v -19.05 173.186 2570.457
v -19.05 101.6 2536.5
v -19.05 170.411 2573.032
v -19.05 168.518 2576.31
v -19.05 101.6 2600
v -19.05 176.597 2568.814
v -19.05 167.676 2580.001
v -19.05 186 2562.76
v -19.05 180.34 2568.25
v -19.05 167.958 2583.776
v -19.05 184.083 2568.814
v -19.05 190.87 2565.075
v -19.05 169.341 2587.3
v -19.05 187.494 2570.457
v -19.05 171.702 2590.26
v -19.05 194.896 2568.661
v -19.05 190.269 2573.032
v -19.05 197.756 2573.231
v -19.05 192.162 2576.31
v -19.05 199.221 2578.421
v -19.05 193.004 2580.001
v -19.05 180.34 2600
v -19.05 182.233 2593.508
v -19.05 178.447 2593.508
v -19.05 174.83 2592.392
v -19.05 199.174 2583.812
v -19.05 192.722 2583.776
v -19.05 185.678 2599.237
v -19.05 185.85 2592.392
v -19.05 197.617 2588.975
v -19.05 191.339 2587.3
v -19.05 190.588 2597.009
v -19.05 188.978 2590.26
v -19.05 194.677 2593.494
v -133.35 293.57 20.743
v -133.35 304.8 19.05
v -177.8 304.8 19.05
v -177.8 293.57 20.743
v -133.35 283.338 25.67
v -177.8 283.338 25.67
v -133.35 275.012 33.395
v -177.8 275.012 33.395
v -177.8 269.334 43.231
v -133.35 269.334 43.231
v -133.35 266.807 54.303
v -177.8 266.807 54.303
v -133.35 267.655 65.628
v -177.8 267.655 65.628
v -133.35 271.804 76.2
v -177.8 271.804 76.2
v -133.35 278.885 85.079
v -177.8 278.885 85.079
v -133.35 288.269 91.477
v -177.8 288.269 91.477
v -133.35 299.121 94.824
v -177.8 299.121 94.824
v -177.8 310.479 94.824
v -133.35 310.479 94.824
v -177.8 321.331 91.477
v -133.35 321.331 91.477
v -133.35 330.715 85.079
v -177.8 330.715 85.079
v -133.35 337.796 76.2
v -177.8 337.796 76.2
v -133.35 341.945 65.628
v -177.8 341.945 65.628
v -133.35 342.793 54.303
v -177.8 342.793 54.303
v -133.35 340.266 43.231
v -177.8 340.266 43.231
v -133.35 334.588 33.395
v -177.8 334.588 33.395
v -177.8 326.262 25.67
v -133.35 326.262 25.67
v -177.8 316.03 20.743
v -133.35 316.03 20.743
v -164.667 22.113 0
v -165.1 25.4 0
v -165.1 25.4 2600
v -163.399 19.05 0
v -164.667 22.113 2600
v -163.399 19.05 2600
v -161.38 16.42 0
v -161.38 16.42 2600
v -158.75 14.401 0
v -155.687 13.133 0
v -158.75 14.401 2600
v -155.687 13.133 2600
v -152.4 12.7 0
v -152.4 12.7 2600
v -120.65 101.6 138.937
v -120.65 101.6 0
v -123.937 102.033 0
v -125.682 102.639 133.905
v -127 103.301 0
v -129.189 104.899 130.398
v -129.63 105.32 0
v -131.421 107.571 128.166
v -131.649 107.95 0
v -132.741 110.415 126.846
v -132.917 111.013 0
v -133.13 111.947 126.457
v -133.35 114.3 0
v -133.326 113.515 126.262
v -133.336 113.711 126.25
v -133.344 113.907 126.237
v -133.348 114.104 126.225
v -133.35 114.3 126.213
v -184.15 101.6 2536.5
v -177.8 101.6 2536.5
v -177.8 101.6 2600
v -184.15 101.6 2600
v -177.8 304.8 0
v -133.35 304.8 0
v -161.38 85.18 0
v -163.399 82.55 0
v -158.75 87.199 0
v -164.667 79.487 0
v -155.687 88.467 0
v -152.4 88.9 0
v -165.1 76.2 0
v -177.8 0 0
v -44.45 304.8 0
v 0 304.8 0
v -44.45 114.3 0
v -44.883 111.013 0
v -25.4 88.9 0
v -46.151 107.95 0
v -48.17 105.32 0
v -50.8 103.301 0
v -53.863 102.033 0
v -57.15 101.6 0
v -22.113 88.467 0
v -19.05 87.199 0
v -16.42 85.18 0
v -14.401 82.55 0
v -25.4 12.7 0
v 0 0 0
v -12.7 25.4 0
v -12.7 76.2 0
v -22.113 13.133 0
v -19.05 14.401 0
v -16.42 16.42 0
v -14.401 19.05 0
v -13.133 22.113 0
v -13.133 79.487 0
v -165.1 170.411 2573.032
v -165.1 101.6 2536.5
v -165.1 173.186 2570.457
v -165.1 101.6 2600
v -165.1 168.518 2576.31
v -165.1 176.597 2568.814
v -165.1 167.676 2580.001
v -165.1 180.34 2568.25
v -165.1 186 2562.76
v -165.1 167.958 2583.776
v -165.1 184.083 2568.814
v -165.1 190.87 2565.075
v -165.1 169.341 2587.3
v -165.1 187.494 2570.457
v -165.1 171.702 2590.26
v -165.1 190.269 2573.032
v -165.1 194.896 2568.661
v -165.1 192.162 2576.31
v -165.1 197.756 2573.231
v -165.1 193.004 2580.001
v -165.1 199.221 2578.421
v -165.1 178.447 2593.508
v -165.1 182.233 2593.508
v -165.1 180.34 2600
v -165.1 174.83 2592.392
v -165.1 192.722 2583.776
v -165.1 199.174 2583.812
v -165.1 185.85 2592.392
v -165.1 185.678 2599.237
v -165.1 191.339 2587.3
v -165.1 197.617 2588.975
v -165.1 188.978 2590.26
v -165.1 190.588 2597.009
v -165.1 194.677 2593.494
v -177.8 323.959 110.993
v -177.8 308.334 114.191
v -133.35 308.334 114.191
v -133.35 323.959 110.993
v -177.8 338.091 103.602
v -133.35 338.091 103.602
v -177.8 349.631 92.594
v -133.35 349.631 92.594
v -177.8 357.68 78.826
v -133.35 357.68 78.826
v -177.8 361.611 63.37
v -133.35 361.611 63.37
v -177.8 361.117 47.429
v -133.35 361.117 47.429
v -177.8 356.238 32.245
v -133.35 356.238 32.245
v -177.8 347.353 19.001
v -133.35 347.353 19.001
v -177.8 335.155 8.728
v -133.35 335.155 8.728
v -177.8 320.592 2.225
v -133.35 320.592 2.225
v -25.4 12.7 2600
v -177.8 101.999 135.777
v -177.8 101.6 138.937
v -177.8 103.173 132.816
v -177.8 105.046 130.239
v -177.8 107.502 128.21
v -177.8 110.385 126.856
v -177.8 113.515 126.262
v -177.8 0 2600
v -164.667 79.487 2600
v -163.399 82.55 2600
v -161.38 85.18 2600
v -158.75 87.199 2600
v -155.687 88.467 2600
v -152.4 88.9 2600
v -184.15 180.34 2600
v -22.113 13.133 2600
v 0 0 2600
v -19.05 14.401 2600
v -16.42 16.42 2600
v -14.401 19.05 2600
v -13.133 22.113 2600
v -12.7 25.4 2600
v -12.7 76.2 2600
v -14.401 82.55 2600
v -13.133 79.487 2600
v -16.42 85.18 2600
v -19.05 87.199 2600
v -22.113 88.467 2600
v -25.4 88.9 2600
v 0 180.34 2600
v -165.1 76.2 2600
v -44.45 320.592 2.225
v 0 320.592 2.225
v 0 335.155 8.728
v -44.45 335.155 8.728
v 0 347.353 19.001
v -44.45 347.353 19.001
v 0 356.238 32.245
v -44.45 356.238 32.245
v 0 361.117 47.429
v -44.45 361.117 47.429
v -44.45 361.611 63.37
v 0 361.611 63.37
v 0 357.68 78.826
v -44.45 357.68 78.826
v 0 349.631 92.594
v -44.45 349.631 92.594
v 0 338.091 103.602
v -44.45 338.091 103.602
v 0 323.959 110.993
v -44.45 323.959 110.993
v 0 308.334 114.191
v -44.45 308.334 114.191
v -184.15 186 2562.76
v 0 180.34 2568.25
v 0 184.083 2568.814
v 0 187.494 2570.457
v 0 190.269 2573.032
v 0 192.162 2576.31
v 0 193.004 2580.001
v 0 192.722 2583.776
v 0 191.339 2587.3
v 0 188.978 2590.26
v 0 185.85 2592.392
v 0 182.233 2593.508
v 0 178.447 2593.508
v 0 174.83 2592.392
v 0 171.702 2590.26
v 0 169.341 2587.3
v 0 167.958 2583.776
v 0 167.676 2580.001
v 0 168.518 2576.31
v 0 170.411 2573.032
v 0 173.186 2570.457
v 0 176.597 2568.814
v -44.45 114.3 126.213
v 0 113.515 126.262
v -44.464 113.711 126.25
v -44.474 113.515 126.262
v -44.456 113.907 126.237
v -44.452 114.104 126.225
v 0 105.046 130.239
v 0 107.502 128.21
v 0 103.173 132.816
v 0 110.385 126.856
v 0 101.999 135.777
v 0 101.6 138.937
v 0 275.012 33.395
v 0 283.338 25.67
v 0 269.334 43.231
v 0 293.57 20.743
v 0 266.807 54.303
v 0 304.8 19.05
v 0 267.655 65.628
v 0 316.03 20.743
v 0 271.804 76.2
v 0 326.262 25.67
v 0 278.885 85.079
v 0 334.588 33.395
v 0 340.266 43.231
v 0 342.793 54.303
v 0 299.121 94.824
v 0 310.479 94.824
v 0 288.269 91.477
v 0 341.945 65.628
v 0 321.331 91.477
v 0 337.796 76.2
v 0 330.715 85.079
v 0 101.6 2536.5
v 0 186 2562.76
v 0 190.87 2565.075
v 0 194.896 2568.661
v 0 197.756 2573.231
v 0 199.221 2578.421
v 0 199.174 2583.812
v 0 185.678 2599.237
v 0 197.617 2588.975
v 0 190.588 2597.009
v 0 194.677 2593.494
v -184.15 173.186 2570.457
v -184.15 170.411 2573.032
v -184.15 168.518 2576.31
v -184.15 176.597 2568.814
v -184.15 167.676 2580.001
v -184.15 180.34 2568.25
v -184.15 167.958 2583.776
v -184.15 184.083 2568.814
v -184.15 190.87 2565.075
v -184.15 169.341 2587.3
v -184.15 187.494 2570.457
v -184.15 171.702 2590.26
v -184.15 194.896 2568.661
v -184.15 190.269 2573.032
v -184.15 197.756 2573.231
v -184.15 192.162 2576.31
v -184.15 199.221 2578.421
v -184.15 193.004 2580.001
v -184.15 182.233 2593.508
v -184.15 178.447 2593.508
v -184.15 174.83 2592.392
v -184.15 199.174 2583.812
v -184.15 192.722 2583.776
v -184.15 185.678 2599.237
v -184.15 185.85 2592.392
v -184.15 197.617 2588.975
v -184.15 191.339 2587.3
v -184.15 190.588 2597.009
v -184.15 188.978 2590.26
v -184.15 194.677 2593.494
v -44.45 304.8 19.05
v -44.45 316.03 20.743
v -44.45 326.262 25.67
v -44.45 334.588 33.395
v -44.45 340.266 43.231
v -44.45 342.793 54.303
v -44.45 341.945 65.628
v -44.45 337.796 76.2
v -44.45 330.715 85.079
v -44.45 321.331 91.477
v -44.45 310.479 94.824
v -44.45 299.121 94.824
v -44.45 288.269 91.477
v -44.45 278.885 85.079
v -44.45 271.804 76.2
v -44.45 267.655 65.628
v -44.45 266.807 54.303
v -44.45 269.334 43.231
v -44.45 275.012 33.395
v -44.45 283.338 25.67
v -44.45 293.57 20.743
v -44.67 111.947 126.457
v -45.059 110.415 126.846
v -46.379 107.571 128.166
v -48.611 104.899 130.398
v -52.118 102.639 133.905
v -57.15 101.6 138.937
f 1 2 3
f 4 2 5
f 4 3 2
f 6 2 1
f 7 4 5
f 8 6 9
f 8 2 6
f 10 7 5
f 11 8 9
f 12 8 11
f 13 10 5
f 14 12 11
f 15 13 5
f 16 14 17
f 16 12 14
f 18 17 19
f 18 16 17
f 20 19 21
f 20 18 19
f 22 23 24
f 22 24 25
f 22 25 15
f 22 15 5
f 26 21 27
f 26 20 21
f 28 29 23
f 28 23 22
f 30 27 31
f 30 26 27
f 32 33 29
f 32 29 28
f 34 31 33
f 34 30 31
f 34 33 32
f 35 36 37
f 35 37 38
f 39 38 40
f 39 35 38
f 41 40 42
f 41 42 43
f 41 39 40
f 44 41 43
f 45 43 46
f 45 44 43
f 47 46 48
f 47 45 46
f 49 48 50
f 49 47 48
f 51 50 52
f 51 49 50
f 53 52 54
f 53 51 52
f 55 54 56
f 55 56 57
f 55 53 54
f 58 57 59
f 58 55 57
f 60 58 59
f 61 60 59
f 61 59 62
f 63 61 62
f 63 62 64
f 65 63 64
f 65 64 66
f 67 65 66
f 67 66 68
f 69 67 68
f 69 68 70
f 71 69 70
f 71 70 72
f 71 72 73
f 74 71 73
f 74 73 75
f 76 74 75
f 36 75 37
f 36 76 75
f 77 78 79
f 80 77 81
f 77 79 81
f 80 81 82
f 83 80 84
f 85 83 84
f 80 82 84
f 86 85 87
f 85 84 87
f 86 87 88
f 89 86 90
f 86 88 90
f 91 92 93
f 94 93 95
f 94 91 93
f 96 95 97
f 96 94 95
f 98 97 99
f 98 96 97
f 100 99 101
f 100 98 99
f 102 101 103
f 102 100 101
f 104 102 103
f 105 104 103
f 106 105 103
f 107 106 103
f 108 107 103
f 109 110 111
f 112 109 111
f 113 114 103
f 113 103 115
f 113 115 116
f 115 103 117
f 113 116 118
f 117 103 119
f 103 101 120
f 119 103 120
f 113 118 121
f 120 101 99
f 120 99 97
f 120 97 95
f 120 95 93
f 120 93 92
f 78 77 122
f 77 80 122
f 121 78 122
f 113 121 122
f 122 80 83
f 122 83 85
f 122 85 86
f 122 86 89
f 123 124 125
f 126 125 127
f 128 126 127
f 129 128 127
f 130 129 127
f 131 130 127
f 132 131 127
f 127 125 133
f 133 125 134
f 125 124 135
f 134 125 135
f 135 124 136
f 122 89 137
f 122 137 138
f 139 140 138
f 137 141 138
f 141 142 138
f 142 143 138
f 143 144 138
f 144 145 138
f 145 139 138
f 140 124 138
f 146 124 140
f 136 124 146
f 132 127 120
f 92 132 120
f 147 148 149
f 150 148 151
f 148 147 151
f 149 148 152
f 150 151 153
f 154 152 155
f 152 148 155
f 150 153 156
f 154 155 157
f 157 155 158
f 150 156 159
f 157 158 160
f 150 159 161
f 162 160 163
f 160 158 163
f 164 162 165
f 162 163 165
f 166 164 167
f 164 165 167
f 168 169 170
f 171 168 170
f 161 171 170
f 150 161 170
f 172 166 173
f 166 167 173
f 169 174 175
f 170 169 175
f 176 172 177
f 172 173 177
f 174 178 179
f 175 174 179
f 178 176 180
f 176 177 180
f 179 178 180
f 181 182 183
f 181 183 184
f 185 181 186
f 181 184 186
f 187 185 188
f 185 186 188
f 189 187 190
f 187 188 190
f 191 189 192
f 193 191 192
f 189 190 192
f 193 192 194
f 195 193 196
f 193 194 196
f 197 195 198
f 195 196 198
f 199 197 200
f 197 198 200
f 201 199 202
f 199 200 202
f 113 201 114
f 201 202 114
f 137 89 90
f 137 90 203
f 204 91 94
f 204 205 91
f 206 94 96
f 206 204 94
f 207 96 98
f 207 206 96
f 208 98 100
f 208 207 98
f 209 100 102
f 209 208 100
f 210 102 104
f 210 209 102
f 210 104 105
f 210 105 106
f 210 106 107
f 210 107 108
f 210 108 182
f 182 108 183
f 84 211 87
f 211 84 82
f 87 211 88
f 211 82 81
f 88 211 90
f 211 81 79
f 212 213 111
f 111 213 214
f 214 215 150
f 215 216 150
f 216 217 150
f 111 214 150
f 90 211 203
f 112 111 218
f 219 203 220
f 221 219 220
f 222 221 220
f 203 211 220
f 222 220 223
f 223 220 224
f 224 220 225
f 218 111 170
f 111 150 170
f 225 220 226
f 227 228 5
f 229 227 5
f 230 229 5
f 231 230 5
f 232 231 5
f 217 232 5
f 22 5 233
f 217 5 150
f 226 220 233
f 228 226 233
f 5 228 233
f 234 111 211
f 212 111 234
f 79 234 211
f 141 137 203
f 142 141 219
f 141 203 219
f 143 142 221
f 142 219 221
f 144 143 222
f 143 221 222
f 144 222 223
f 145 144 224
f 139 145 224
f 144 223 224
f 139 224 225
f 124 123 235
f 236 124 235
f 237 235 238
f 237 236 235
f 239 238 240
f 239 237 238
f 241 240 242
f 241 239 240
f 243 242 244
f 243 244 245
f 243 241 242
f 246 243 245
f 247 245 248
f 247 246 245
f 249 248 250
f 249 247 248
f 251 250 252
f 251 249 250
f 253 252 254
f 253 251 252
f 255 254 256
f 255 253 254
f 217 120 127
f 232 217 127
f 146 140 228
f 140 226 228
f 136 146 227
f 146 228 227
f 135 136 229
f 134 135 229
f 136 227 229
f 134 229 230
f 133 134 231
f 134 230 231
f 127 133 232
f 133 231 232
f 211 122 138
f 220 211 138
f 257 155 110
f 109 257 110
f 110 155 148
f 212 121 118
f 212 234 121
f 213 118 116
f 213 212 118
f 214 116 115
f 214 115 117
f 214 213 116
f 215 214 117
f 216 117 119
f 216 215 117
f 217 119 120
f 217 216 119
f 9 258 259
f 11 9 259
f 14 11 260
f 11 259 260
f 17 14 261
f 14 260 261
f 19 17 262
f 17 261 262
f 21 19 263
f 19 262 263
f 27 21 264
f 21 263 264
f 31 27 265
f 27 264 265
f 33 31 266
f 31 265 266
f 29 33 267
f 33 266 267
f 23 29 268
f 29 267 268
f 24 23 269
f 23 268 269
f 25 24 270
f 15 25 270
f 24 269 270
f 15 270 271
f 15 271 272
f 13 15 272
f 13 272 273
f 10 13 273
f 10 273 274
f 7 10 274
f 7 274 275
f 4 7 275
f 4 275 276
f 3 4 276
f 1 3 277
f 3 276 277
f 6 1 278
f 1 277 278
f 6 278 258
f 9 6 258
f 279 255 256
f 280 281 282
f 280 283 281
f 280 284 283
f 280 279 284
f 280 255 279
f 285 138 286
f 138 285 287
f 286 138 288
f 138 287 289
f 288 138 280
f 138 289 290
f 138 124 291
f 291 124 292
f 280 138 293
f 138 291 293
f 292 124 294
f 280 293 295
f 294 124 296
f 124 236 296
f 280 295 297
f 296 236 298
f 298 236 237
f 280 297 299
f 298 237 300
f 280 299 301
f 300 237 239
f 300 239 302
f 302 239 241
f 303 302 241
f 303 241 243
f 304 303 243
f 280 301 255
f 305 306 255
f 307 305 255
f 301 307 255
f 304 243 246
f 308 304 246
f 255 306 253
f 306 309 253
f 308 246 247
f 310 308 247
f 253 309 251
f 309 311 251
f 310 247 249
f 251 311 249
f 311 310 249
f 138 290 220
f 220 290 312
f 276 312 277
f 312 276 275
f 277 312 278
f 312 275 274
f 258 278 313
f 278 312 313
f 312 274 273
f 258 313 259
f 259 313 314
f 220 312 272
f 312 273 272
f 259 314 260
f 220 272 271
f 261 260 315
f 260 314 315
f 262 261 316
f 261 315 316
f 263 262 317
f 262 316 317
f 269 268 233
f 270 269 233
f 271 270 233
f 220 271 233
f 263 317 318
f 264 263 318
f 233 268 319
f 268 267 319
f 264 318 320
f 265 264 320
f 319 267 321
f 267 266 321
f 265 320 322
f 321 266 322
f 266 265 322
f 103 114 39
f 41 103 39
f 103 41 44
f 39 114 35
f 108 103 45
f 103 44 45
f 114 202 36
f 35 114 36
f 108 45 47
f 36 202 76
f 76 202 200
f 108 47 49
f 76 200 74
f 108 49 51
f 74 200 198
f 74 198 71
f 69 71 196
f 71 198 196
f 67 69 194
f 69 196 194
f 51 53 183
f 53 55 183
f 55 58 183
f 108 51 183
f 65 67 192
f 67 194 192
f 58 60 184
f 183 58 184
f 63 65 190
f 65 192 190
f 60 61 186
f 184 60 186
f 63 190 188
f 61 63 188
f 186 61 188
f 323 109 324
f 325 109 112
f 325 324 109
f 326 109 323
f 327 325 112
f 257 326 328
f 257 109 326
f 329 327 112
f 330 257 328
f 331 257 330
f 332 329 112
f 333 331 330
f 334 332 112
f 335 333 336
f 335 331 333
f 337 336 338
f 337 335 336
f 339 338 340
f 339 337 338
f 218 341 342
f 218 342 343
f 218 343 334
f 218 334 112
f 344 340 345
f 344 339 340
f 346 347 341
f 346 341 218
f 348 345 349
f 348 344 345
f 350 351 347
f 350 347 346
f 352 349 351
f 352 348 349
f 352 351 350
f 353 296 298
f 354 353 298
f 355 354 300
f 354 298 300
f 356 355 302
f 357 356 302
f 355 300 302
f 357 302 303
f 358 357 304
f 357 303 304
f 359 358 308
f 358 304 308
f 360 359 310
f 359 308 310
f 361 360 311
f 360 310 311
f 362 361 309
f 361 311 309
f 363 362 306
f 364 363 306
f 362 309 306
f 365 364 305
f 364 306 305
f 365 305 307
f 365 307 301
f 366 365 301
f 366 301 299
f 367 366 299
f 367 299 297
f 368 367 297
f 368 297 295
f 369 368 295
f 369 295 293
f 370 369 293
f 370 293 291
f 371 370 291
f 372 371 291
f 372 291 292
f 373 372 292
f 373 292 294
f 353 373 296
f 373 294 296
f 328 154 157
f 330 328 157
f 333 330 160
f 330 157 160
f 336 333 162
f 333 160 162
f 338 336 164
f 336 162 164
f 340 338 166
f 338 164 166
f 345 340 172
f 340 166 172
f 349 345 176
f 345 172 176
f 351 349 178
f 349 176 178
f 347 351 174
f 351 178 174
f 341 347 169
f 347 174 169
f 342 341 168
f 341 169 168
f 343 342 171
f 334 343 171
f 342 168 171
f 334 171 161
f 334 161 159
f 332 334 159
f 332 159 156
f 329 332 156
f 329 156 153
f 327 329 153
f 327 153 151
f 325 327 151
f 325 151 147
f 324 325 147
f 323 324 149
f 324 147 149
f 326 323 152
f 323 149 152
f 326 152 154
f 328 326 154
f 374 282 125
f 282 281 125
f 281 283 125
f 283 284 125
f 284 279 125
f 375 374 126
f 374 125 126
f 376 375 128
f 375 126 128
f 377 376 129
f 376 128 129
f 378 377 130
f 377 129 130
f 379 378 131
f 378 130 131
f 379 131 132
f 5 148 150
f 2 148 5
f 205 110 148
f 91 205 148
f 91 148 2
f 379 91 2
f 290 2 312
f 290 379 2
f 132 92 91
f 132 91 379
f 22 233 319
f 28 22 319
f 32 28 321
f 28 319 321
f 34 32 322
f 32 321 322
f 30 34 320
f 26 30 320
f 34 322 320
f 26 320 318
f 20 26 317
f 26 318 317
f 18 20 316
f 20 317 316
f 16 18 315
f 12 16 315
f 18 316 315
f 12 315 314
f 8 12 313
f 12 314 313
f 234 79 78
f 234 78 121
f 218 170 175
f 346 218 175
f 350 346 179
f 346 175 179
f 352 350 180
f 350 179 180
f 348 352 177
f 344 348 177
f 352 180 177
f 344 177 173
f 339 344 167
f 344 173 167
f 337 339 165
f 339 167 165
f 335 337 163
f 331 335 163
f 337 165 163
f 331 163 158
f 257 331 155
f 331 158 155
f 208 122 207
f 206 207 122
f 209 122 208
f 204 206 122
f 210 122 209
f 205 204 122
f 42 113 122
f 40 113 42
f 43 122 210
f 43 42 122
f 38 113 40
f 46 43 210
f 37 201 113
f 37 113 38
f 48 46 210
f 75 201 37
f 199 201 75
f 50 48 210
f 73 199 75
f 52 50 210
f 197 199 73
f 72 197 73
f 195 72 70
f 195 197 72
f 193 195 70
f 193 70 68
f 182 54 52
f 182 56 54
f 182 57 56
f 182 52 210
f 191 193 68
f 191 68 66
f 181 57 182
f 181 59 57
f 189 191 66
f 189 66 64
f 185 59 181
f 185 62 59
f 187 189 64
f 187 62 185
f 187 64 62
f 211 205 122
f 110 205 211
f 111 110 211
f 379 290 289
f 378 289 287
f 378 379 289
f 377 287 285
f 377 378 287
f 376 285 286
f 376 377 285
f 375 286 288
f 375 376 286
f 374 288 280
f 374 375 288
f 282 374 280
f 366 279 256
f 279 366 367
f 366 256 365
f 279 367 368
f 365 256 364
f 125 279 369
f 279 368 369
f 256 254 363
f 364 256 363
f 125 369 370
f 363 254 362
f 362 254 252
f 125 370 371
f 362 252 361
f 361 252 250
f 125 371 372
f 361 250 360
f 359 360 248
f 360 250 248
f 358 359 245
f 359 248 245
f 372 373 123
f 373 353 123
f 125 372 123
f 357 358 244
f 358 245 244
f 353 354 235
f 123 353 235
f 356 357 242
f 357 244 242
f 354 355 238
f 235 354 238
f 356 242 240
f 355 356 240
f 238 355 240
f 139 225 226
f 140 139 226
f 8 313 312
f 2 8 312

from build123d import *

# Parameters (mm, degrees)
SKETCH2_W           = 177.8
SKETCH2_H           = 101.6
SKETCH2_W_2         = 152.4
SKETCH2_H_2         = 76.2
BOSS_EXTRUDE2_DEPTH = 2600
SKETCH1_R           = 38.1
BOSS_EXTRUDE3_DEPTH = 44.45
BOSS_EXTRUDE5_START = -44.45
SKETCH3_R           = 38.1
BOSS_EXTRUDE5_DEPTH = 44.45
FILLET1_R           = 12.7
FILLET2_R           = 12.7
SKETCH5_R           = 12.7
BOSS_EXTRUDE7_DEPTH = 19.05
LPATTERN1_COUNT     = 2
LPATTERN1_PITCH     = 165.1


with BuildPart() as part:
    # Sketch2 → Boss-Extrude2 (new body)
    with BuildSketch(Plane.XY):
        with Locations((-88.9, 50.8)):
            Rectangle(SKETCH2_W, SKETCH2_H)
        with Locations((-88.9, 50.8)):
            Rectangle(SKETCH2_W_2, SKETCH2_H_2, mode=Mode.SUBTRACT)
    extrude(amount=BOSS_EXTRUDE2_DEPTH)

    # Sketch1 → Boss-Extrude3 (add)
    with BuildSketch(Plane(origin=(0, 0, 0), x_dir=(0, 0, -1), z_dir=(1, 0, 0))):
        with BuildLine():
            Line((-127, 101.6), (0, 101.6))
            Line((0, 101.6), (0, 304.8))
            ThreePointArc((0, 304.8), (-55.382017361, 361.922646449), (-114.190611982, 308.334272869))
            Line((-114.190611982, 308.334272869), (-127, 101.6))
        make_face()
        with Locations((-57.15, 304.8)):
            Circle(SKETCH1_R, mode=Mode.SUBTRACT)
    extrude(amount=-BOSS_EXTRUDE3_DEPTH)

    # Sketch3 → Boss-Extrude5 (add)
    with BuildSketch(Plane.ZY.offset(177.8).offset(BOSS_EXTRUDE5_START)):
        with BuildLine():
            Line((0, 304.8), (0, 101.6))
            Line((0, 101.6), (127, 101.6))
            Line((127, 101.6), (114.190611982, 308.334272869))
            ThreePointArc((114.190611982, 308.334272869), (55.382017361, 361.922646449), (0, 304.8))
        make_face()
        with Locations(Location((57.15, 304.8, 0), (0, 0, 180))):
            Circle(SKETCH3_R, mode=Mode.SUBTRACT)
    extrude(amount=BOSS_EXTRUDE5_DEPTH)

    # Fillet1
    fillet1_edges = [part.edges().sort_by_distance(p)[0] for p in [
        (-12.7, 88.9, 1300),
        (-165.1, 88.9, 1300),
        (-165.1, 12.7, 1300),
        (-12.7, 12.7, 1300),
    ]]
    fillet(fillet1_edges, radius=FILLET1_R)

    # Fillet2
    fillet2_edges = [part.edges().sort_by_distance(p)[0] for p in [
        (-44.45, 101.6, 63.5),
        (-22.225, 101.6, 127),
        (-133.35, 101.6, 63.5),
        (-155.575, 101.6, 127),
    ]]
    fillet(fillet2_edges, radius=FILLET2_R)

    # Sketch5 → Boss-Extrude7 (add)
    with BuildSketch(Plane(origin=(0, 0, 0), x_dir=(0, 0, -1), z_dir=(1, 0, 0))):
        with BuildLine():
            Line((-2600, 101.6), (-2600, 180.34))
            ThreePointArc((-2600, 180.34), (-2583.812295525, 199.173740052), (-2562.760129729, 185.999604185))
            Line((-2562.760129729, 185.999604185), (-2536.5, 101.6))
            Line((-2536.5, 101.6), (-2600, 101.6))
        make_face()
        with Locations((-2580.95, 180.34)):
            Circle(SKETCH5_R, mode=Mode.SUBTRACT)
    boss_extrude7 = extrude(amount=-BOSS_EXTRUDE7_DEPTH)

    # LPattern1: Boss-Extrude7 ×2
    with Locations(*[(-i * LPATTERN1_PITCH, 0, 0) for i in range(1, LPATTERN1_COUNT)]):
        add(boss_extrude7)


solid = part.part
